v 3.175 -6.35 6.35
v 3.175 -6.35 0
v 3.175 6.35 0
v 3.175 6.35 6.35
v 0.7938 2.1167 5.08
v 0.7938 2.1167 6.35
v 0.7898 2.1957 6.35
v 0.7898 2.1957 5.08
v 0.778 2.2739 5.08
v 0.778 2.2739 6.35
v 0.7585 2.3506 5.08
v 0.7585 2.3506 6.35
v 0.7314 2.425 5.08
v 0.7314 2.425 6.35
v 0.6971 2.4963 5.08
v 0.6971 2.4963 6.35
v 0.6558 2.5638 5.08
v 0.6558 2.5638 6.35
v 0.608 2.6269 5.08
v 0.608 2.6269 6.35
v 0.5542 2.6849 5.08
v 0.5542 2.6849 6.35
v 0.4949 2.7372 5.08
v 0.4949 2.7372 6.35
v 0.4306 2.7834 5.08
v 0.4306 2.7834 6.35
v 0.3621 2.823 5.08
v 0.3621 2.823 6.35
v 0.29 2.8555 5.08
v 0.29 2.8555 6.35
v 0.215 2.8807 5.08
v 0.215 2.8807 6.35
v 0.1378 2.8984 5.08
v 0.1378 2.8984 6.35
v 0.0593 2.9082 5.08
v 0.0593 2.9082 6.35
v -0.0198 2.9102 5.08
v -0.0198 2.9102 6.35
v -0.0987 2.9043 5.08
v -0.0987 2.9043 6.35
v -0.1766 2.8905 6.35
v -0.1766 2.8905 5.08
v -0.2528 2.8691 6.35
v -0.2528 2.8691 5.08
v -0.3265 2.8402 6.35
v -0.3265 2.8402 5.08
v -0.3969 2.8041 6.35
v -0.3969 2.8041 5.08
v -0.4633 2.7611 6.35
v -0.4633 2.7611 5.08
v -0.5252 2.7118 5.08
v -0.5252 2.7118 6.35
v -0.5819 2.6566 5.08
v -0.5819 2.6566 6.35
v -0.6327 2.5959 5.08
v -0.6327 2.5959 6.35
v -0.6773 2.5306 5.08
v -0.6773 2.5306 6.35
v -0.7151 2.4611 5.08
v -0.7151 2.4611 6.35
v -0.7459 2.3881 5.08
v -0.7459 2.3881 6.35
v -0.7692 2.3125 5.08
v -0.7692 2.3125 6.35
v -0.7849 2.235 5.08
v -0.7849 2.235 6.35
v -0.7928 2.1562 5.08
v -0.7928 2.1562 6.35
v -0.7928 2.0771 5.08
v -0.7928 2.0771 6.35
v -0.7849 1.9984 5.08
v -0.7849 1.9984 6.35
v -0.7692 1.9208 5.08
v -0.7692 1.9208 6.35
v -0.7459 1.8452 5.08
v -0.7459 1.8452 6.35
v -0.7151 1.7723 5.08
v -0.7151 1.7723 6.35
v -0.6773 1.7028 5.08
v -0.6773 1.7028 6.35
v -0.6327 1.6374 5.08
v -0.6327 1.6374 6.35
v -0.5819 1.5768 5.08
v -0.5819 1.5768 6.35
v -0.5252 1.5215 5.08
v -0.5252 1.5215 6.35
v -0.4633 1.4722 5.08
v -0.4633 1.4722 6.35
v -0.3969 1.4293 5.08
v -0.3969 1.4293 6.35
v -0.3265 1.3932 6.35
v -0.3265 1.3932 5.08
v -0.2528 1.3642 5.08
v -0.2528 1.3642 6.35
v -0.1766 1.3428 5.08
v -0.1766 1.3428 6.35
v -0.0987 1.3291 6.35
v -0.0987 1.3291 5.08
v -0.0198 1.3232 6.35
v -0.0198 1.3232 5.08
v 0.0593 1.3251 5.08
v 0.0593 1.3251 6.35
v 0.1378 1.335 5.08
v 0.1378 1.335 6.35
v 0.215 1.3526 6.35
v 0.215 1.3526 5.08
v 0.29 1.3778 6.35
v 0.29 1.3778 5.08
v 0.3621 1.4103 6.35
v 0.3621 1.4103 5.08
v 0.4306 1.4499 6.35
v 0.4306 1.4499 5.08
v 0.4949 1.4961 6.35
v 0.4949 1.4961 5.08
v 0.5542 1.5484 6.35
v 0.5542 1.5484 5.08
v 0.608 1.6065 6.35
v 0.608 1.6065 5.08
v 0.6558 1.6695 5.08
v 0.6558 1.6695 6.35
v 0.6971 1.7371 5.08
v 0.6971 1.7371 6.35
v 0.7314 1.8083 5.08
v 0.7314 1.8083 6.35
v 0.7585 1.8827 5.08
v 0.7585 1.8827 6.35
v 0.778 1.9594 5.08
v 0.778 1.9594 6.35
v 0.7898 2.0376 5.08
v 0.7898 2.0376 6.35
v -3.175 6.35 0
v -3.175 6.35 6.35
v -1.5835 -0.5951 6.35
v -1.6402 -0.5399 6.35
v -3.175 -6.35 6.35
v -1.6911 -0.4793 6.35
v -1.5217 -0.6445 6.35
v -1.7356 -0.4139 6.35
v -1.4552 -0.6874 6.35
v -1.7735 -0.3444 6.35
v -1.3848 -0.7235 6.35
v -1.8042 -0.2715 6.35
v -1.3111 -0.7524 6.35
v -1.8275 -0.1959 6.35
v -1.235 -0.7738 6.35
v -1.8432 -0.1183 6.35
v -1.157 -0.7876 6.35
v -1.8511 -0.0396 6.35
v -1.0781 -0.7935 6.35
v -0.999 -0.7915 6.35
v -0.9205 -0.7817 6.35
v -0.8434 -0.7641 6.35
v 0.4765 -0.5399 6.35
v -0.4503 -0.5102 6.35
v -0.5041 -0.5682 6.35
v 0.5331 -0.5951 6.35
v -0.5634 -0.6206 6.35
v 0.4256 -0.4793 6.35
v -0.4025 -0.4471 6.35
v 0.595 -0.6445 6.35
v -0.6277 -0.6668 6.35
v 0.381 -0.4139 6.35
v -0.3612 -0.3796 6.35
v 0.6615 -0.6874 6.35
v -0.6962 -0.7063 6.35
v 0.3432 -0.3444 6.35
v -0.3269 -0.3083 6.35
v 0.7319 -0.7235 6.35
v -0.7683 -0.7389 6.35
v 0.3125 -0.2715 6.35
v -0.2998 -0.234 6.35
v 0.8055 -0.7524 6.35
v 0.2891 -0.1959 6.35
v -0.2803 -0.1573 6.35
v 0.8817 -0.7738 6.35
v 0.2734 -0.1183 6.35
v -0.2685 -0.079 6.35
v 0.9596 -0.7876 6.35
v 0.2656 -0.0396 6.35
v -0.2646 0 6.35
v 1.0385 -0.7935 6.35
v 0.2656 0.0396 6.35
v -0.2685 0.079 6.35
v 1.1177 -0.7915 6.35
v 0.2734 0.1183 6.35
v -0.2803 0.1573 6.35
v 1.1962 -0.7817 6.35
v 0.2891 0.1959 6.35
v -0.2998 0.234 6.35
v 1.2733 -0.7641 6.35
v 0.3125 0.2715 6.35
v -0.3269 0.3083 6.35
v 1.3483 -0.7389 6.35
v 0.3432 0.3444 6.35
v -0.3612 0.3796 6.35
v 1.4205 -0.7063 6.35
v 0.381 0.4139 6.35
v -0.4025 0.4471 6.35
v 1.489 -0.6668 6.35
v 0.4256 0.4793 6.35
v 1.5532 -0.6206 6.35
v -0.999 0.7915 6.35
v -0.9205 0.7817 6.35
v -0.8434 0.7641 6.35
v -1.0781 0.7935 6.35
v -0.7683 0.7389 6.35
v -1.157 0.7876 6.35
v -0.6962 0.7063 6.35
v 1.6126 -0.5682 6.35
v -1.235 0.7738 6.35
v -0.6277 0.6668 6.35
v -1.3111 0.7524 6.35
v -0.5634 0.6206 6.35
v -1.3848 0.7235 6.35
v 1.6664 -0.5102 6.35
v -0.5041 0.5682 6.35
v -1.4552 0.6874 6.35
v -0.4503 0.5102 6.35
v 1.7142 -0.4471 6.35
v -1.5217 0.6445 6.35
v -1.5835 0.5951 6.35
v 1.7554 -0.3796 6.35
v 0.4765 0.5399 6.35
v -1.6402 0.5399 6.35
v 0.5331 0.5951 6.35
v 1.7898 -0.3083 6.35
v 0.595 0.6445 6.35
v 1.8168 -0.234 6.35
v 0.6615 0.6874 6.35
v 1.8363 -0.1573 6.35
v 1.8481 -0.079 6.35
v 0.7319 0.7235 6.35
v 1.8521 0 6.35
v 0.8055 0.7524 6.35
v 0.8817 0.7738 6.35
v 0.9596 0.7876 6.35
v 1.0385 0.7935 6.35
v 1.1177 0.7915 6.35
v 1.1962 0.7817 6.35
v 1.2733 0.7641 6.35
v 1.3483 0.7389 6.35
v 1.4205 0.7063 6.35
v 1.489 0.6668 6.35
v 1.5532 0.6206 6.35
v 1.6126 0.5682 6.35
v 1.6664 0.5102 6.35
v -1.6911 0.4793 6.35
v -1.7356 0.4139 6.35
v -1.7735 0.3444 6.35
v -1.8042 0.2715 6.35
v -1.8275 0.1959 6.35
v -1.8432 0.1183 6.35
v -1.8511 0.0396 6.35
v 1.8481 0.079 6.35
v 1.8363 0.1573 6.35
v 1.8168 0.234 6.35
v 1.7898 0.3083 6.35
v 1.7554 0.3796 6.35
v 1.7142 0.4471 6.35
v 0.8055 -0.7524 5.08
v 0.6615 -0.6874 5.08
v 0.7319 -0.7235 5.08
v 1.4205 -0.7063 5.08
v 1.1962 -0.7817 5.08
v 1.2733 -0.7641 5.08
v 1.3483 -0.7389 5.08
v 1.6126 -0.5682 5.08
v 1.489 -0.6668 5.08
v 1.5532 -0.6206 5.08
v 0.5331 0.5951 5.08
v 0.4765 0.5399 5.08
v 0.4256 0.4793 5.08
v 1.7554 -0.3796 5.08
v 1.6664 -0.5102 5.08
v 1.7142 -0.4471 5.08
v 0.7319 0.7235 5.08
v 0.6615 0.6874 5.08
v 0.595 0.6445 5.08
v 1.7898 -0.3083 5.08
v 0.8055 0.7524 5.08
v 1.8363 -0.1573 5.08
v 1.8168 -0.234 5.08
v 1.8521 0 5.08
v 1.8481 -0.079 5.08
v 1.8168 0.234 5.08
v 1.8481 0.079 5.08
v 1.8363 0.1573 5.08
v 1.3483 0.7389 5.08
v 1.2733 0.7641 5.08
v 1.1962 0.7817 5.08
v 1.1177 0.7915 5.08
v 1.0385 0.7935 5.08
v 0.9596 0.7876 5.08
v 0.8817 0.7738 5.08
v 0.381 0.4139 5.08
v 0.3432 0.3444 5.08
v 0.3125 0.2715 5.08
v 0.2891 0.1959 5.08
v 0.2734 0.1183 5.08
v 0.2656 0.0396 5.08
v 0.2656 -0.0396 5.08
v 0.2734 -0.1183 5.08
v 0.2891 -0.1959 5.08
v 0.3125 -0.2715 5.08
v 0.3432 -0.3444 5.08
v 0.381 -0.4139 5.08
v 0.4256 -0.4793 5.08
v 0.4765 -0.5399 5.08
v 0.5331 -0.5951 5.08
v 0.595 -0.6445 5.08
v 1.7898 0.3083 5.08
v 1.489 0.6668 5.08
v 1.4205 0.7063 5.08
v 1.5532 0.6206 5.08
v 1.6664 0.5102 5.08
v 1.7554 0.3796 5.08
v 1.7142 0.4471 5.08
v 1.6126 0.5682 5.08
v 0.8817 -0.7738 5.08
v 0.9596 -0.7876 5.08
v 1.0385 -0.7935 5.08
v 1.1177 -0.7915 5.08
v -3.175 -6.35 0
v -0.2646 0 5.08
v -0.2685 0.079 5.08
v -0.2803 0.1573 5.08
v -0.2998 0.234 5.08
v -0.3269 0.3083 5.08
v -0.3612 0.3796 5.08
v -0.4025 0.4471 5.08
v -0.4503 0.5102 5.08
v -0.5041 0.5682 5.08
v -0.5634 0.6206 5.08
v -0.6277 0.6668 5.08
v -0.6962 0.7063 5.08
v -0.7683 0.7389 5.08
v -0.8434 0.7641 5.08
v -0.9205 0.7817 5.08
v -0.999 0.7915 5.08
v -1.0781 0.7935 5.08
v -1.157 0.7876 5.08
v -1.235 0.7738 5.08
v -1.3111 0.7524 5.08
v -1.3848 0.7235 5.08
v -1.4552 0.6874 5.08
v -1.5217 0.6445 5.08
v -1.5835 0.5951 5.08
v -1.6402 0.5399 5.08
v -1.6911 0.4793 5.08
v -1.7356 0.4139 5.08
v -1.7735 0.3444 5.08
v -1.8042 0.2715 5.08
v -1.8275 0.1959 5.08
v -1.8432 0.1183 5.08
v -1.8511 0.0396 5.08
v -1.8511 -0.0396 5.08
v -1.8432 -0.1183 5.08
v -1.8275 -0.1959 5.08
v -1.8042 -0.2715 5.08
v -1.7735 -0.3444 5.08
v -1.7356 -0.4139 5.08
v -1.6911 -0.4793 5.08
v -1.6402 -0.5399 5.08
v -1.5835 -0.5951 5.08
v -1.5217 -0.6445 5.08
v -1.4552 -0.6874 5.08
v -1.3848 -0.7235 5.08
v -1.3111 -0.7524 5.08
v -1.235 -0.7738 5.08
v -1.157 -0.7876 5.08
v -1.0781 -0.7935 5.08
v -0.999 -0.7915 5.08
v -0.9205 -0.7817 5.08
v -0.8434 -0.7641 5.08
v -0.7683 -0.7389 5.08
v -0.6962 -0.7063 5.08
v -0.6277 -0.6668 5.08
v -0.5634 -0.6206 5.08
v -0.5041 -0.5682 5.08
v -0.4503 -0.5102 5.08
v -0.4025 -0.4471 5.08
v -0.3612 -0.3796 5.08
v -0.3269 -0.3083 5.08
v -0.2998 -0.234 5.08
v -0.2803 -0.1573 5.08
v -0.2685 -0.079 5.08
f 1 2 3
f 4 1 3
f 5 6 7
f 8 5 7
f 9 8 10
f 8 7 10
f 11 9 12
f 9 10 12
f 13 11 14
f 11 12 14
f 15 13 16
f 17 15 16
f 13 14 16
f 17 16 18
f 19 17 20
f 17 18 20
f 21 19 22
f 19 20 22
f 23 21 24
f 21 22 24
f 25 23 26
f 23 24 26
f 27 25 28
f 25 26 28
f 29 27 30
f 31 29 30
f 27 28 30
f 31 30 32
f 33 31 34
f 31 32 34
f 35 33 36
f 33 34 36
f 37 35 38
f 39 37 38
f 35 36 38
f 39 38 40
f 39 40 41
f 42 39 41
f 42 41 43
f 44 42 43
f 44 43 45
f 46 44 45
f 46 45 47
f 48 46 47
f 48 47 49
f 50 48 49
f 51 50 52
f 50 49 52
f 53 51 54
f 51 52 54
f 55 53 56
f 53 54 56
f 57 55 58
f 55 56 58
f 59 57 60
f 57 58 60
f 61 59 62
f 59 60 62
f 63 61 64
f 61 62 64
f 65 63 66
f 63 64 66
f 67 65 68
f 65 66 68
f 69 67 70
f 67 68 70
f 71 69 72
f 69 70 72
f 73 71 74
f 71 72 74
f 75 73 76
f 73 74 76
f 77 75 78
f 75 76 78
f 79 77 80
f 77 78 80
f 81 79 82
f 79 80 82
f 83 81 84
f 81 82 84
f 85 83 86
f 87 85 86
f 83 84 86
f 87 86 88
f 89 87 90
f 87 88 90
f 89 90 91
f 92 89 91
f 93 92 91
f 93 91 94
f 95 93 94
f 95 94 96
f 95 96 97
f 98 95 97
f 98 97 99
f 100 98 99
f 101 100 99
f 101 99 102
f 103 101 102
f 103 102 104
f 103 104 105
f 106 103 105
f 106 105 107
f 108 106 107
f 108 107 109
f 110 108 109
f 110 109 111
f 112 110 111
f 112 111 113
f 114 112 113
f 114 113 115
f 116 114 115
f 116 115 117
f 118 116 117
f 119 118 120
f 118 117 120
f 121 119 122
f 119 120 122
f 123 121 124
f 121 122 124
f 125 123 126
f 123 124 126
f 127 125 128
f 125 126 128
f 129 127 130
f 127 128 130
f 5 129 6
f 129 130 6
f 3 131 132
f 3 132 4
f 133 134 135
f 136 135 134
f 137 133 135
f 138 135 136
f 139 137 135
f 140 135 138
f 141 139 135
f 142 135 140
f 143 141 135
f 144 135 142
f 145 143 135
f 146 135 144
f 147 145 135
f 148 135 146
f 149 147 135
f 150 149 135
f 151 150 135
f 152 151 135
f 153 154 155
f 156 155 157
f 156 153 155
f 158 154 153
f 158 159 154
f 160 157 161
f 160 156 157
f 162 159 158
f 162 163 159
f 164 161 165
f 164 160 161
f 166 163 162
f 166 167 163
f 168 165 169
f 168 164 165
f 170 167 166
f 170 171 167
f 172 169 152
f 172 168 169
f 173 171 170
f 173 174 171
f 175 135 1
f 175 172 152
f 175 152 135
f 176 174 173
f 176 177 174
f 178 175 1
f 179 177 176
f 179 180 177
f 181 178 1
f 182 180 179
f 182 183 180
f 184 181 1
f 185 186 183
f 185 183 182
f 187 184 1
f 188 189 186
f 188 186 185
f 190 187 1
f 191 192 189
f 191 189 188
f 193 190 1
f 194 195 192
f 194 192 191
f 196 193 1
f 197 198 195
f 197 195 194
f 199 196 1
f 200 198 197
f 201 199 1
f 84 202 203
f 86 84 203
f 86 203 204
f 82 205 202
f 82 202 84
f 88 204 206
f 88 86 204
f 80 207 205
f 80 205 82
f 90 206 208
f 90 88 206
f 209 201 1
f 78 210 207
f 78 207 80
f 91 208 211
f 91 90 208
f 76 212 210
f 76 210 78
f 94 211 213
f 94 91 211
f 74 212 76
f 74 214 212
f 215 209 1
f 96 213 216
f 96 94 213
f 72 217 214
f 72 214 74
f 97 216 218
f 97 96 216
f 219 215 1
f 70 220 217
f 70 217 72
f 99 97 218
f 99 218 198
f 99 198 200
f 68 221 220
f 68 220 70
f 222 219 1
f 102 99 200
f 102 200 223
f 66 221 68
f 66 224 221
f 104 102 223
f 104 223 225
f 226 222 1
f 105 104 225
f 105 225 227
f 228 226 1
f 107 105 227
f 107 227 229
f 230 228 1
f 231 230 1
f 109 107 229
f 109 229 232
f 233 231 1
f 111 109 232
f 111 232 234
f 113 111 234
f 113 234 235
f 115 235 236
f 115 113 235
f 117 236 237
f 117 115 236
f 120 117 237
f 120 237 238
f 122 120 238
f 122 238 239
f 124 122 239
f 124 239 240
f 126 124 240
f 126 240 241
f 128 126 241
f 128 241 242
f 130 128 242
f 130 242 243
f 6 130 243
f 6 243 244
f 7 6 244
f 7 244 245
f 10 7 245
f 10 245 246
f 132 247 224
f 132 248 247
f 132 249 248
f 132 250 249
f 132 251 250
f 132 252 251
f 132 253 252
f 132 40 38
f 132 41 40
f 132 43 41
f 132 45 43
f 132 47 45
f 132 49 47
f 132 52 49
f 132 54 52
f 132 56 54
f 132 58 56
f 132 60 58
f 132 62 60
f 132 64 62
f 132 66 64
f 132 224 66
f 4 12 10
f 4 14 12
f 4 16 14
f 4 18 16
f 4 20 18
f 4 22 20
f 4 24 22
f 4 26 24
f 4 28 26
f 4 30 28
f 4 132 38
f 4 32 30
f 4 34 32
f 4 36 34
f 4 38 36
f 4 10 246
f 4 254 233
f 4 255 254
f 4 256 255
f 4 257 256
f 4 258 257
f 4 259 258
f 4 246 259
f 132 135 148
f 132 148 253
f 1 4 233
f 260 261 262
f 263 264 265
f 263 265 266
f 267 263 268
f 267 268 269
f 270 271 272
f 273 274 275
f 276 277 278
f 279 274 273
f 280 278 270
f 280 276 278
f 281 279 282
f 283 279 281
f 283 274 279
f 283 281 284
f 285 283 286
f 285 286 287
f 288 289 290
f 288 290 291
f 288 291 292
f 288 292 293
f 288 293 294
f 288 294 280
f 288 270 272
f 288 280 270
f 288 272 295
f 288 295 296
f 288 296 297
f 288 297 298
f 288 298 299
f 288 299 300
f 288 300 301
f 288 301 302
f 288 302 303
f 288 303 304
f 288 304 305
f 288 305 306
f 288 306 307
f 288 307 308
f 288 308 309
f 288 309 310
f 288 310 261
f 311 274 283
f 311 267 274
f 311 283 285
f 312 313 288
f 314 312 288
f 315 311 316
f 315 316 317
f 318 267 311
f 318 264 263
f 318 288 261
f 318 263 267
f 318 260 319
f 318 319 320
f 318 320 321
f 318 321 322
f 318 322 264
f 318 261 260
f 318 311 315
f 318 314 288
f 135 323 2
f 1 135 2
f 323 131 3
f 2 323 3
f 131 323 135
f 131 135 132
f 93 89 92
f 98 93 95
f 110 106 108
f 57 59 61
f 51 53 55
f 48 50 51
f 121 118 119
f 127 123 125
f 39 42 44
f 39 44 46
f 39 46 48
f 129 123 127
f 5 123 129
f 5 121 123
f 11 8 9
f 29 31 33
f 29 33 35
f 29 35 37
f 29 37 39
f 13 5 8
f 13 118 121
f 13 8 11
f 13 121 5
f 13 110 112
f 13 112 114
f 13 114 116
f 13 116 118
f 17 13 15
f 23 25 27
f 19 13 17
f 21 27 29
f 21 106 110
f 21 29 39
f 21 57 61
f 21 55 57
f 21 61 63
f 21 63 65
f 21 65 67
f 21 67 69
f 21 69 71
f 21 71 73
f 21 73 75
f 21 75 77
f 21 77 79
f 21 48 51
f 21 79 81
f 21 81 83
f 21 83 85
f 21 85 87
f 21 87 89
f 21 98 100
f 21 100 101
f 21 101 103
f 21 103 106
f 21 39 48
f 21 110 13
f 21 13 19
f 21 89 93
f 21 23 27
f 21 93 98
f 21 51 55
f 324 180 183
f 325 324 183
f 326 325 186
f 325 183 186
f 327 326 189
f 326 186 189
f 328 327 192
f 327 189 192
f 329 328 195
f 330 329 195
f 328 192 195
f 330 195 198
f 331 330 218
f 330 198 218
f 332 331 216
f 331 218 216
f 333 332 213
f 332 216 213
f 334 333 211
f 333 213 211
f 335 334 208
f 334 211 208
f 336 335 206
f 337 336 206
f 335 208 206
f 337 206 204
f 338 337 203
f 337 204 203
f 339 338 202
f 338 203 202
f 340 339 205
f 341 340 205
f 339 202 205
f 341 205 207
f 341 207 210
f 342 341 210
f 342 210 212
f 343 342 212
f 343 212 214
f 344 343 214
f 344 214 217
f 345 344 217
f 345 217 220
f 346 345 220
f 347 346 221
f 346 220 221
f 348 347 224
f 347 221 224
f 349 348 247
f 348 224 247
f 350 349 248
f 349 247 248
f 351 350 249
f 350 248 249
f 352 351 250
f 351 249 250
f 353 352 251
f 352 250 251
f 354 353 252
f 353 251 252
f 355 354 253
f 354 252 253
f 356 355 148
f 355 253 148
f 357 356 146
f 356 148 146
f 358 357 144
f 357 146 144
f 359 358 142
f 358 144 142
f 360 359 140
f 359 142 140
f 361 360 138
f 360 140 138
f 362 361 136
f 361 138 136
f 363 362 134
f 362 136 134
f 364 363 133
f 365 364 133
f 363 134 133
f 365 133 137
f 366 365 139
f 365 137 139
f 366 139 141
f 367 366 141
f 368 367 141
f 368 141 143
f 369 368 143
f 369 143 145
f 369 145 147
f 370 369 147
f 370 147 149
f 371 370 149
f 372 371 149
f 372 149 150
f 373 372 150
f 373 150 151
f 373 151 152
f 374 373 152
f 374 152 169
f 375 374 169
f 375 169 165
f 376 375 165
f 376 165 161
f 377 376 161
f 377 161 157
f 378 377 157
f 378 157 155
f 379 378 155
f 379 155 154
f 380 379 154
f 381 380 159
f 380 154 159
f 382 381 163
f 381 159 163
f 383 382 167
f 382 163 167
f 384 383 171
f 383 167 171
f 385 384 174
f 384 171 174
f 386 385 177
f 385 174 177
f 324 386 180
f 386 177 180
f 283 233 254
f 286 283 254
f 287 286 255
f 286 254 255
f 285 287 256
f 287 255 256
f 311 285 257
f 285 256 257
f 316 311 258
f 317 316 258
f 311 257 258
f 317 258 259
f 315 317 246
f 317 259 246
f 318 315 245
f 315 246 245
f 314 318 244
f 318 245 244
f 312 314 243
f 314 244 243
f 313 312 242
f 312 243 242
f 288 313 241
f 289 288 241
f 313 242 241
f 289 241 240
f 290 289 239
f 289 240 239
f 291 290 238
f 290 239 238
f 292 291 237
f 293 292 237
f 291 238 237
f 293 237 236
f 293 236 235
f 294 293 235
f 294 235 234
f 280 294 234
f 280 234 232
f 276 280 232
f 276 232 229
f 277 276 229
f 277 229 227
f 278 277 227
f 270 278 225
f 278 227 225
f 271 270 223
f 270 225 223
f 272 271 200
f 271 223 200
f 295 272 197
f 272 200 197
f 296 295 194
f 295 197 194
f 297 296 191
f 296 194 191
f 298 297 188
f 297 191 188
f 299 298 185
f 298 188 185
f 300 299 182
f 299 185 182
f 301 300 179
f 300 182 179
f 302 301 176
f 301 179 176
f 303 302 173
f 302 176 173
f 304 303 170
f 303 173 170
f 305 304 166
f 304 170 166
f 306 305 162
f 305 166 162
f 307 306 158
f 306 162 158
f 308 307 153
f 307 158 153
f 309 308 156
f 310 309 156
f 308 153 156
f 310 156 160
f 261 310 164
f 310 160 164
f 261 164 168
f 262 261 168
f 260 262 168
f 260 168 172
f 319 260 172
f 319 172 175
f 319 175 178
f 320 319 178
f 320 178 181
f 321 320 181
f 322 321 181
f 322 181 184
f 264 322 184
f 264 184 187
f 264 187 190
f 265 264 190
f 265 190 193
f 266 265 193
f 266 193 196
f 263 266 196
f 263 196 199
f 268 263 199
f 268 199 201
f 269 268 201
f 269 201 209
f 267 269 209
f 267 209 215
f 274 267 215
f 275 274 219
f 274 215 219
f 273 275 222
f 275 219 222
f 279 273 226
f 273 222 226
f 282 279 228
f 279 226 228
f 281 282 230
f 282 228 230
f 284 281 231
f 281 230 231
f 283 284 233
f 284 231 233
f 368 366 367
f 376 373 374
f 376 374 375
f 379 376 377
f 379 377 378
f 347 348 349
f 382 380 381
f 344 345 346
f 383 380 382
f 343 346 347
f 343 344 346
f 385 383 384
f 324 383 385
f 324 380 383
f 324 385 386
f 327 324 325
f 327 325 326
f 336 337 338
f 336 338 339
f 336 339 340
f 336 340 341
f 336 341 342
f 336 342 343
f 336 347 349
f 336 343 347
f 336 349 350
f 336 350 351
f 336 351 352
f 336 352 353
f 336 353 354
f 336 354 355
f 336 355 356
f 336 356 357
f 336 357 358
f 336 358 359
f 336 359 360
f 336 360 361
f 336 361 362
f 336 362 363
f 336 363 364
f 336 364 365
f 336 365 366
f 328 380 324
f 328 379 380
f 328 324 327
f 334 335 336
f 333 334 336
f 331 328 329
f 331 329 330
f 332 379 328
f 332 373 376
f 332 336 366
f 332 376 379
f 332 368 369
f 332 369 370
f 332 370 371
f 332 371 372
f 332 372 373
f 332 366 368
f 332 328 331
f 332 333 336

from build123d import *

# Parameters (mm, degrees)
SKETCH1_W           = 6.35
SKETCH1_H           = 12.7
SKETCH1_R           = 0.79375
BOSS_EXTRUDE1_DEPTH = 6.35
CUT_EXTRUDE1_START  = 6.35
SKETCH1_3_R         = 0.79375
CUT_EXTRUDE1_DEPTH  = 1.27


with BuildPart() as part:
    # Sketch1 → Boss-Extrude1 (new body)
    with BuildSketch(Plane.XY):
        Rectangle(SKETCH1_W, SKETCH1_H)
        with Locations((1.058333333, 0)):
            Circle(SKETCH1_R, mode=Mode.SUBTRACT)
        with Locations((-1.058333333, 0)):
            Circle(SKETCH1_R, mode=Mode.SUBTRACT)
        with Locations((0, 2.116666667)):
            Circle(SKETCH1_R, mode=Mode.SUBTRACT)
        with Locations((-1.058333333, 0)):
            Circle(SKETCH1_R)
        with Locations((0, 2.116666667)):
            Circle(SKETCH1_R)
        with Locations((1.058333333, 0)):
            Circle(SKETCH1_R)
    extrude(amount=BOSS_EXTRUDE1_DEPTH)

    # Sketch1<3> → Cut-Extrude1 (cut)
    with BuildSketch(Plane.XY.offset(CUT_EXTRUDE1_START)):
        with Locations((-1.058333333, 0)):
            Circle(SKETCH1_3_R)
        with Locations((0, 2.116666667)):
            Circle(SKETCH1_3_R)
        with Locations((1.058333333, 0)):
            Circle(SKETCH1_3_R)
    extrude(amount=-CUT_EXTRUDE1_DEPTH, mode=Mode.SUBTRACT)


solid = part.part
